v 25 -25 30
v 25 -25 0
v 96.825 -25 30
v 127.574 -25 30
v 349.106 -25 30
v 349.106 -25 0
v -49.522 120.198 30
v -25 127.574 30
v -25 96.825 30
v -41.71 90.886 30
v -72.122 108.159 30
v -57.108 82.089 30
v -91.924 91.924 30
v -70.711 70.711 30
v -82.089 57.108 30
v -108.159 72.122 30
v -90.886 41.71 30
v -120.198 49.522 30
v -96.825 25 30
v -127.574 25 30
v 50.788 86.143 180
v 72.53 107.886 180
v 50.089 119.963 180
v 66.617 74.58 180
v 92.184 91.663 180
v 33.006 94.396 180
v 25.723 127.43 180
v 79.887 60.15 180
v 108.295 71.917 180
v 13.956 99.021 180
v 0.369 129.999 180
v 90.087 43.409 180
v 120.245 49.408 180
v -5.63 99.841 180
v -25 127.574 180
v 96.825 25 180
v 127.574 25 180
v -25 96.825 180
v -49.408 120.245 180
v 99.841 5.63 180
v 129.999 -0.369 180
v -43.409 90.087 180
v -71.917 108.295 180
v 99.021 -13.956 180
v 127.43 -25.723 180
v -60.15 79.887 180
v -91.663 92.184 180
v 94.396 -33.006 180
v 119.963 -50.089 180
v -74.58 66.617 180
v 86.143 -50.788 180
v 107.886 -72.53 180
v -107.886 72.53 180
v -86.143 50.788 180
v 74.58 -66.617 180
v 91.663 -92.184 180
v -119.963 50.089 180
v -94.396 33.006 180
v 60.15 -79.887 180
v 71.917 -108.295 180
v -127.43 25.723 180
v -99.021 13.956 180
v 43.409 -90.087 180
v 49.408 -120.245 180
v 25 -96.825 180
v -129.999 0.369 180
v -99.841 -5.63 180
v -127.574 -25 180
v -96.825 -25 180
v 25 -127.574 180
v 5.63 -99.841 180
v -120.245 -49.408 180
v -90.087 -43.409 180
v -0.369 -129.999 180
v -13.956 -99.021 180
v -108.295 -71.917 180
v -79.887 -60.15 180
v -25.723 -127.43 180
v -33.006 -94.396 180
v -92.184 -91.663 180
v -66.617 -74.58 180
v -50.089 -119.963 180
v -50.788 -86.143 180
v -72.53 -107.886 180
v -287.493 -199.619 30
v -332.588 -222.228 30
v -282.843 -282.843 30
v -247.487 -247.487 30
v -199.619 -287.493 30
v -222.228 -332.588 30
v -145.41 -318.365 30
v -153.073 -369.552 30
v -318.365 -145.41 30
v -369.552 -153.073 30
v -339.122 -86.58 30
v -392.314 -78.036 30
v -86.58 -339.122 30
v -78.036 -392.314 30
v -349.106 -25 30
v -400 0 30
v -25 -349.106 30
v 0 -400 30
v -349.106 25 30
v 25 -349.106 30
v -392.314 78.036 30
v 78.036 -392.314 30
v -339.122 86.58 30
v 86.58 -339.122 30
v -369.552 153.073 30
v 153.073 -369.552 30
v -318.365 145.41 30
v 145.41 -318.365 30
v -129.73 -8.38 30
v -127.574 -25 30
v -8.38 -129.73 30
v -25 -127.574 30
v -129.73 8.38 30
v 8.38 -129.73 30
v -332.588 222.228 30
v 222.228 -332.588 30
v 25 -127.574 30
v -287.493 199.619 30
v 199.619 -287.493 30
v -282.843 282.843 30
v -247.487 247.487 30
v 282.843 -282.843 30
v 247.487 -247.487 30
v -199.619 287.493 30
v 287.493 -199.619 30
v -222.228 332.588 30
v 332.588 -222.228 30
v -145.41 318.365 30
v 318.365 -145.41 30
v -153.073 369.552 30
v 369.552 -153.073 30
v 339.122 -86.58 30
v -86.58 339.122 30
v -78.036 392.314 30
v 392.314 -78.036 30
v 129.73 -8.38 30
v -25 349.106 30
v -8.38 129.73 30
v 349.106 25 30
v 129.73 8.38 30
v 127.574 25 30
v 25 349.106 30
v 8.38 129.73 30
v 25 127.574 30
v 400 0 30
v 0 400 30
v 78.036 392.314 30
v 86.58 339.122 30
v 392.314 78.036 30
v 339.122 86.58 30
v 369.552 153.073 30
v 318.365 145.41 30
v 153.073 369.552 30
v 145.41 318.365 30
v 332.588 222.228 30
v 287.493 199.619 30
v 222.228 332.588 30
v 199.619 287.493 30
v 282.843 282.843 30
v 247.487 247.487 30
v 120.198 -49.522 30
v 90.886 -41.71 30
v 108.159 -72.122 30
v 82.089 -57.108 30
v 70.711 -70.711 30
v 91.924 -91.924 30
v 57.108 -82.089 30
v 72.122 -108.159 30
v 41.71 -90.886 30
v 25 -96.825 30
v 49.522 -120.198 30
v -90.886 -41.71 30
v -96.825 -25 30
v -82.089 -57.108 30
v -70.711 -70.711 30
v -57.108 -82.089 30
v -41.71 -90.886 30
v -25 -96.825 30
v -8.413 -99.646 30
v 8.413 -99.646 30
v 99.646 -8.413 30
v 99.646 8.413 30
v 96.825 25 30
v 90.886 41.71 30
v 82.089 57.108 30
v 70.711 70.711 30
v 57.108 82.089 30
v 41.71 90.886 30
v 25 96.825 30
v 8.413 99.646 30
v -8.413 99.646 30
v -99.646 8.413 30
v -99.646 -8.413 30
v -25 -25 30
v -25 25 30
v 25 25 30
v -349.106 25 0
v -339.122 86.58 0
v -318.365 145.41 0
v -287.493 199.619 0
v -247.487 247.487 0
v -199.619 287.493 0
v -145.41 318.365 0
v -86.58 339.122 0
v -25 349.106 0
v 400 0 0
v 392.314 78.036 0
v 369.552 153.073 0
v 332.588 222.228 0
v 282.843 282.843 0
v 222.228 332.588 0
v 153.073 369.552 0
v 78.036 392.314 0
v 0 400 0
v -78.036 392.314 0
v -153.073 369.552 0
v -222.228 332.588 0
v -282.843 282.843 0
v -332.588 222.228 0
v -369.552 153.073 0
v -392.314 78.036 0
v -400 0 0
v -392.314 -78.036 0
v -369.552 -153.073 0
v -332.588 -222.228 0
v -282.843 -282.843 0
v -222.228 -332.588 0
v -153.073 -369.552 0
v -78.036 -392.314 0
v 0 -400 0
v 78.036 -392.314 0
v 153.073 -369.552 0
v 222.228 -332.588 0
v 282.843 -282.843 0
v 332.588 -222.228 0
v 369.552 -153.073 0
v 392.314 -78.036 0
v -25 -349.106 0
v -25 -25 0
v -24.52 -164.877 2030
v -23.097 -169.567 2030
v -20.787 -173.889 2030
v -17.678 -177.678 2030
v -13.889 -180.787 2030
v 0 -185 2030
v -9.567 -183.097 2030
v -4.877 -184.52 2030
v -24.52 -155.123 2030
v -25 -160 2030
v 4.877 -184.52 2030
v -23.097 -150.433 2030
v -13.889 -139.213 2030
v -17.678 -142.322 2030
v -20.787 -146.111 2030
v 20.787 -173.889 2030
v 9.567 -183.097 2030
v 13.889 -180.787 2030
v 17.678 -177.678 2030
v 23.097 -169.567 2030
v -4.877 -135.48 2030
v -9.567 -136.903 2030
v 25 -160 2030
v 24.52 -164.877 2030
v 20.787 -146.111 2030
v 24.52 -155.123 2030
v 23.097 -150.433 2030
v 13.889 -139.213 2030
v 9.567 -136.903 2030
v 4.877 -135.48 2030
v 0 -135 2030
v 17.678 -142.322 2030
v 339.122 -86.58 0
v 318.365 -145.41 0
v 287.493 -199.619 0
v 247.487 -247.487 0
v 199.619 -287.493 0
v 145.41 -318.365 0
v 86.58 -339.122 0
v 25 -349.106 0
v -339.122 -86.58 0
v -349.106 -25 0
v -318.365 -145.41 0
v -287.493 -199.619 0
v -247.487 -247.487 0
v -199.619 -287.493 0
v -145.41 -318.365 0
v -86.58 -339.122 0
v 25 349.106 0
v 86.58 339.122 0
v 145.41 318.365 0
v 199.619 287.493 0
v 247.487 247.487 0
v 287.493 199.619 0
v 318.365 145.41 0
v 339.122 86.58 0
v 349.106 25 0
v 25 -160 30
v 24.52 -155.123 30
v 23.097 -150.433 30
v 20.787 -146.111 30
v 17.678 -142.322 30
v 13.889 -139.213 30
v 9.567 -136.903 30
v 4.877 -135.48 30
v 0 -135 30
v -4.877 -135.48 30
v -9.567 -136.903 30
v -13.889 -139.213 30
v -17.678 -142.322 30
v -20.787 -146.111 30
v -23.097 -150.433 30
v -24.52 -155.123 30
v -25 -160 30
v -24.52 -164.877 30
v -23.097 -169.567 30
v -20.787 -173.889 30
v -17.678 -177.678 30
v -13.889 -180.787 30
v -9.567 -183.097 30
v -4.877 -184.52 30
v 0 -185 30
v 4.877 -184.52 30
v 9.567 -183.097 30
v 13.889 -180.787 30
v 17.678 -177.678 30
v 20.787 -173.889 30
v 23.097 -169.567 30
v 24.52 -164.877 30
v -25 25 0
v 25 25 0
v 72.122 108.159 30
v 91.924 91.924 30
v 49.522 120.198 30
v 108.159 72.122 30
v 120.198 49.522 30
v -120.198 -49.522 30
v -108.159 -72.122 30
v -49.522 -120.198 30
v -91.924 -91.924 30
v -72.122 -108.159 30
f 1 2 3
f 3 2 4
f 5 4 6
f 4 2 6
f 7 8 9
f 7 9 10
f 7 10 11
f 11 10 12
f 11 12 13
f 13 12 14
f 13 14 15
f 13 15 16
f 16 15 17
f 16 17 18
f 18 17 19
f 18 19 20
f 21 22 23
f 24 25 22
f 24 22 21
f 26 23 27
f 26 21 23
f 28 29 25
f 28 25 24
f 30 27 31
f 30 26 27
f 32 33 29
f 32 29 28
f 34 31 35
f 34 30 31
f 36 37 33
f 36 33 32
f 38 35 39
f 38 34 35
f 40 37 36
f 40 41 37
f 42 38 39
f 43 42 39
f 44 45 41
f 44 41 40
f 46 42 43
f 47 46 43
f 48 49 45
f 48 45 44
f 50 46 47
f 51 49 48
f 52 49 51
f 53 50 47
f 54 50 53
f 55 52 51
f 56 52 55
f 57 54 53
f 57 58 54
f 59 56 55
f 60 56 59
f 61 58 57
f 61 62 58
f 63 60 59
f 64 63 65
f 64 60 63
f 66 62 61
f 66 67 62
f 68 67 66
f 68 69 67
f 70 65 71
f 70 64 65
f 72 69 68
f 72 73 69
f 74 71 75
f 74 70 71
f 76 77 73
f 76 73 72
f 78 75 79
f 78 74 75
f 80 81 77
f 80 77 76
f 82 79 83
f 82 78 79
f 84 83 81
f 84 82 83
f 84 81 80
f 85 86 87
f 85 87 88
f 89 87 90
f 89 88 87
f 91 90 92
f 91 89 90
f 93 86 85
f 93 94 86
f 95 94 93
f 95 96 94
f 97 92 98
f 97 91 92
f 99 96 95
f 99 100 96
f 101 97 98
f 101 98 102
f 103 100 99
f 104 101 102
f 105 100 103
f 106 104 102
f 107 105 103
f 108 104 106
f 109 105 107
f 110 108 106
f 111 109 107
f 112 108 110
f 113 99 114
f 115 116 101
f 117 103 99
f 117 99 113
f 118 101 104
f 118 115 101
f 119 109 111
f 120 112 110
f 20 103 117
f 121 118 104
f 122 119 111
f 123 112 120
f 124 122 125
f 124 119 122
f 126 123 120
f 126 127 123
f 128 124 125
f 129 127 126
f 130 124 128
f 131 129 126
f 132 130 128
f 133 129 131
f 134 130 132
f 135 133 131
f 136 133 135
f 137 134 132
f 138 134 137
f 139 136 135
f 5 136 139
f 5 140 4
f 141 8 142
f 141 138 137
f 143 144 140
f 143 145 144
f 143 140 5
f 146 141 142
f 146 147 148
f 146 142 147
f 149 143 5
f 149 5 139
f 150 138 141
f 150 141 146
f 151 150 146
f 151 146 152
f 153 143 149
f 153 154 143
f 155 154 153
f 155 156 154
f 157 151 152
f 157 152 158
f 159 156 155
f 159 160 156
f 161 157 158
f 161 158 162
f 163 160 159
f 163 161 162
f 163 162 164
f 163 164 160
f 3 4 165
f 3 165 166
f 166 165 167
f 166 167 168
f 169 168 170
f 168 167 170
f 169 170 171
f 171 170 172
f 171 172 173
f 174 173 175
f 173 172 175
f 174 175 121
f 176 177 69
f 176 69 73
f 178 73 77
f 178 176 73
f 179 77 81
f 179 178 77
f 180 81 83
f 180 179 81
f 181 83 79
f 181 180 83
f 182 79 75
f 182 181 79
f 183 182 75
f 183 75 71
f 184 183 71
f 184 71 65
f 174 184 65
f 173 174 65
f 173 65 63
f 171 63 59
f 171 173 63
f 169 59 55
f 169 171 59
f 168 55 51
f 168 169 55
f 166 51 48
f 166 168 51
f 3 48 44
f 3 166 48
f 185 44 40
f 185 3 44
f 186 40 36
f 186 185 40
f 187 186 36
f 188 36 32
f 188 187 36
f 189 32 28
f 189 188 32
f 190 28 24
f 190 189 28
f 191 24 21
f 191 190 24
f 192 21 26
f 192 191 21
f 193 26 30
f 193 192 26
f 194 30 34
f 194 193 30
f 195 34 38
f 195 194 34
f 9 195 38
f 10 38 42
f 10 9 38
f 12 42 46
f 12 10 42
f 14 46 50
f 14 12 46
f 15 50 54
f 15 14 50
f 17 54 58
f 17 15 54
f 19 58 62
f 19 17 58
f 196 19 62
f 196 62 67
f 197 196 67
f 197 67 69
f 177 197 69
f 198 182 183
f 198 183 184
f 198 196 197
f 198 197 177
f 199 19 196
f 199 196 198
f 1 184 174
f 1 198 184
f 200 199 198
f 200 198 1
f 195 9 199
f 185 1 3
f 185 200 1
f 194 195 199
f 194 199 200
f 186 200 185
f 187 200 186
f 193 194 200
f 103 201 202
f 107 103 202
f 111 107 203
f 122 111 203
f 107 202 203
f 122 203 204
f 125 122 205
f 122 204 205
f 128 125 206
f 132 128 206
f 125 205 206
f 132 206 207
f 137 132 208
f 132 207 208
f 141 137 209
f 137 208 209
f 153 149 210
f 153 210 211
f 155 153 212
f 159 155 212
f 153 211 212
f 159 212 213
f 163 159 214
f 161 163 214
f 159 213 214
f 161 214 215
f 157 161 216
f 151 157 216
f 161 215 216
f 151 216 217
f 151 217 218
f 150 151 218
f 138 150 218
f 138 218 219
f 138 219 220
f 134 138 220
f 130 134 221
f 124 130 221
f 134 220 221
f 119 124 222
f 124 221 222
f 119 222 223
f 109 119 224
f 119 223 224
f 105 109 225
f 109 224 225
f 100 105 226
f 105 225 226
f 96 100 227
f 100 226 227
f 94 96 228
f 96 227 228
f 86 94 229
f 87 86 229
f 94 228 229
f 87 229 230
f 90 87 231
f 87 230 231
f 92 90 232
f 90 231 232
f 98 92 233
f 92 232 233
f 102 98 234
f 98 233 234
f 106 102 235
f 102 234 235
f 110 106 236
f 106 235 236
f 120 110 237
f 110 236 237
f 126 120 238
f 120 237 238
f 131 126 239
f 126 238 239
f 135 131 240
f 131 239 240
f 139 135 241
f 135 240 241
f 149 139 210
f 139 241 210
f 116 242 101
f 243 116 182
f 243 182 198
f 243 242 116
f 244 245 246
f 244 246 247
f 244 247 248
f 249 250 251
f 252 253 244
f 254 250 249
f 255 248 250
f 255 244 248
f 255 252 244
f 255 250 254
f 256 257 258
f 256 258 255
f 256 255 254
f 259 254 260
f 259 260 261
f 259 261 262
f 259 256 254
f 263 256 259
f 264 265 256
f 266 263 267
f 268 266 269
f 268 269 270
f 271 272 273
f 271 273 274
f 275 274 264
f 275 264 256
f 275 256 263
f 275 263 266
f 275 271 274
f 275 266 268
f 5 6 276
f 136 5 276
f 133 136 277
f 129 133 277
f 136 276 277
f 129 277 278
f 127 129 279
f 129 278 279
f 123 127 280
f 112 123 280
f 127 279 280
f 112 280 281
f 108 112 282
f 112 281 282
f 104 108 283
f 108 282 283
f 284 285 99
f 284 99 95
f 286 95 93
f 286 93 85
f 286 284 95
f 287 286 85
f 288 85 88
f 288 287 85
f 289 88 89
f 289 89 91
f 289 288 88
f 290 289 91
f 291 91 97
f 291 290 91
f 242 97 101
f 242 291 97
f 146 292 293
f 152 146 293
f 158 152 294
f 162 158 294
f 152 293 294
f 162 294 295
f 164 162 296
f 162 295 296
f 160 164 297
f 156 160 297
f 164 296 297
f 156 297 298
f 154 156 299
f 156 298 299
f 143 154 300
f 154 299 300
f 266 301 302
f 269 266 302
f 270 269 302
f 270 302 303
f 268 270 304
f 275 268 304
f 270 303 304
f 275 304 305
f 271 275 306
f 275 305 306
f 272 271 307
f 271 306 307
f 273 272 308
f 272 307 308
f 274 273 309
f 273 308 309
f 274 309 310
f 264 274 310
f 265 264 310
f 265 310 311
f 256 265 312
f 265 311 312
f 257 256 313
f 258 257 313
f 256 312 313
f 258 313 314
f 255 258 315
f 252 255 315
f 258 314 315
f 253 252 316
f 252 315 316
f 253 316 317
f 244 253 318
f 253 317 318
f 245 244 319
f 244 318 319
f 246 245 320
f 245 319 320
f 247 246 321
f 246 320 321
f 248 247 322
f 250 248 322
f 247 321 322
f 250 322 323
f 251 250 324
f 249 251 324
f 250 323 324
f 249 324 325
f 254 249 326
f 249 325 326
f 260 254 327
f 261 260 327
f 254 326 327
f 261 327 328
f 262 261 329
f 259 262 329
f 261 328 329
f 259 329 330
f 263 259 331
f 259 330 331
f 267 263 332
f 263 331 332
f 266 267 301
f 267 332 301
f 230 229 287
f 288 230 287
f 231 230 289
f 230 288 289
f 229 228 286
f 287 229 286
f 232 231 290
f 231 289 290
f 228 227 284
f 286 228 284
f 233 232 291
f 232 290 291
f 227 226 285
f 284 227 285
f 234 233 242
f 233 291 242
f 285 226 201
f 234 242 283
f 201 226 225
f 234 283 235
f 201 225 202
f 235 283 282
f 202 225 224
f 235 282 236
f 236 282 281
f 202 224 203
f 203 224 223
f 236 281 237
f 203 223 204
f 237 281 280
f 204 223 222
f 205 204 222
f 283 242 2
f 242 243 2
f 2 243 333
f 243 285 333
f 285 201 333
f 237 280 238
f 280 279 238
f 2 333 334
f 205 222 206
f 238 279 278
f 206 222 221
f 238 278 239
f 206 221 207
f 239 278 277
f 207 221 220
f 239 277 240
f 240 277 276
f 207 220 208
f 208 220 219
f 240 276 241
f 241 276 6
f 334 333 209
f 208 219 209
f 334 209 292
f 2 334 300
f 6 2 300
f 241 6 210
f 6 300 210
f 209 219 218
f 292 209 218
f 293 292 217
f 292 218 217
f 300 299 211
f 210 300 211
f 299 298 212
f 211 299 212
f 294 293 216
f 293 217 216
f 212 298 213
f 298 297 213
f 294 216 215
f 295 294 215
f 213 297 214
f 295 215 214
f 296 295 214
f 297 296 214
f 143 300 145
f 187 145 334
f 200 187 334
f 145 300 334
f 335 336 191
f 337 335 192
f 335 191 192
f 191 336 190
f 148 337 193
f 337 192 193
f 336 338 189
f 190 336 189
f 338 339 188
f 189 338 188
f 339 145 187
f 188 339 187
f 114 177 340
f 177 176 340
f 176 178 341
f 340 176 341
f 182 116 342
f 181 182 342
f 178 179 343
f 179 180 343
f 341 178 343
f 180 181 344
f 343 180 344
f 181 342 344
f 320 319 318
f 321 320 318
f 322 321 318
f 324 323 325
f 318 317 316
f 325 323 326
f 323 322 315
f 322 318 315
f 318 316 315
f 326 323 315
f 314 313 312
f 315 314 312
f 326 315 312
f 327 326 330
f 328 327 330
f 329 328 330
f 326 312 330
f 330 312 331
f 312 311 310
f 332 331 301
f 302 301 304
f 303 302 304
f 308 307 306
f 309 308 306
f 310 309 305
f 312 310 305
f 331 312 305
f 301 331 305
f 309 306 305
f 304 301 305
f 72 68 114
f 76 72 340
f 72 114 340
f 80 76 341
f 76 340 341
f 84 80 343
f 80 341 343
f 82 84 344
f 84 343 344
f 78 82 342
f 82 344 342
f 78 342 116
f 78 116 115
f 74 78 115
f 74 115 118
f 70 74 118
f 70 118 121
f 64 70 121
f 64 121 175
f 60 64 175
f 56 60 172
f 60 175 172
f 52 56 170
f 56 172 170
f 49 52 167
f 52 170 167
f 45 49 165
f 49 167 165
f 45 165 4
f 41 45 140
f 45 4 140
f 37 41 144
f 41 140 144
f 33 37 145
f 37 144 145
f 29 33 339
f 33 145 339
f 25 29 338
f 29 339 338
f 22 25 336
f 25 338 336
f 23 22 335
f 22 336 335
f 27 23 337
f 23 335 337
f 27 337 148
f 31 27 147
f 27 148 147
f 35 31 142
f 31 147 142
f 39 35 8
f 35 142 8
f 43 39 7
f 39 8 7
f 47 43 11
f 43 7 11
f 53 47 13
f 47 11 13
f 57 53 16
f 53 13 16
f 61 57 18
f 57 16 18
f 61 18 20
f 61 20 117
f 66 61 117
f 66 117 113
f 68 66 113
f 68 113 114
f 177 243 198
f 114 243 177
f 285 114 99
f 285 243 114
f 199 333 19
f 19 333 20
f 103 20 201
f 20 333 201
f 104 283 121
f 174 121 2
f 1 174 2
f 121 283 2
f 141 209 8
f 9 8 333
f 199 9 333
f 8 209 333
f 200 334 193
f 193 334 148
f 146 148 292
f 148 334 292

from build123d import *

# Parameters (mm, degrees)
CROQUIS1_R              = 400
SALIENTE_EXTRUIR1_DEPTH = 30
CROQUIS2_R              = 130
CROQUIS2_R_2            = 100
SALIENTE_EXTRUIR2_DEPTH = 150
CROQUIS3_R              = 25
SALIENTE_EXTRUIR3_DEPTH = 2000


with BuildPart() as part:
    # Croquis1 → Saliente-Extruir1 (new body)
    with BuildSketch(Plane(origin=(0, 0, 0), x_dir=(0, 1, 0), z_dir=(0, 0, 1))):
        with Locations(Location((0, 0, 0), (0, 0, 270))):
            Circle(CROQUIS1_R)
        with BuildLine():
            Line((25, -25), (349.106001094, -25))
            ThreePointArc((349.106001094, -25), (247.487373415, -247.487373415), (25, -349.106001094))
            Line((25, -349.106001094), (25, -25))
        make_face(mode=Mode.SUBTRACT)
        with BuildLine():
            Line((-349.106001094, 25), (-25, 25))
            Line((-25, 25), (-25, 349.106001094))
            ThreePointArc((-25, 349.106001094), (-247.487373415, 247.487373415), (-349.106001094, 25))
        make_face(mode=Mode.SUBTRACT)
        with BuildLine():
            Line((-349.106001094, -25), (-25, -25))
            Line((-25, -25), (-25, -349.106001094))
            ThreePointArc((-25, -349.106001094), (-247.487373415, -247.487373415), (-349.106001094, -25))
        make_face(mode=Mode.SUBTRACT)
        with BuildLine():
            Line((25, 25), (25, 349.106001094))
            ThreePointArc((25, 349.106001094), (247.487373415, 247.487373415), (349.106001094, 25))
            Line((349.106001094, 25), (25, 25))
        make_face(mode=Mode.SUBTRACT)
    extrude(amount=SALIENTE_EXTRUIR1_DEPTH)

    # Croquis2 → Saliente-Extruir2 (add)
    with BuildSketch(Plane.XY.offset(30)):
        with Locations(Location((0, 0, 0), (0, 0, 191.087489211))):
            Circle(CROQUIS2_R)
        with Locations(Location((0, 0, 0), (0, 0, 194.477512186))):
            Circle(CROQUIS2_R_2, mode=Mode.SUBTRACT)
    extrude(amount=SALIENTE_EXTRUIR2_DEPTH)


with BuildPart() as body_2:
    # Croquis3 → Saliente-Extruir3 (new body)
    with BuildSketch(Plane.XY.offset(30)):
        with Locations((0, -160)):
            Circle(CROQUIS3_R)
    extrude(amount=SALIENTE_EXTRUIR3_DEPTH)


solid = Compound([part.part, body_2.part])
